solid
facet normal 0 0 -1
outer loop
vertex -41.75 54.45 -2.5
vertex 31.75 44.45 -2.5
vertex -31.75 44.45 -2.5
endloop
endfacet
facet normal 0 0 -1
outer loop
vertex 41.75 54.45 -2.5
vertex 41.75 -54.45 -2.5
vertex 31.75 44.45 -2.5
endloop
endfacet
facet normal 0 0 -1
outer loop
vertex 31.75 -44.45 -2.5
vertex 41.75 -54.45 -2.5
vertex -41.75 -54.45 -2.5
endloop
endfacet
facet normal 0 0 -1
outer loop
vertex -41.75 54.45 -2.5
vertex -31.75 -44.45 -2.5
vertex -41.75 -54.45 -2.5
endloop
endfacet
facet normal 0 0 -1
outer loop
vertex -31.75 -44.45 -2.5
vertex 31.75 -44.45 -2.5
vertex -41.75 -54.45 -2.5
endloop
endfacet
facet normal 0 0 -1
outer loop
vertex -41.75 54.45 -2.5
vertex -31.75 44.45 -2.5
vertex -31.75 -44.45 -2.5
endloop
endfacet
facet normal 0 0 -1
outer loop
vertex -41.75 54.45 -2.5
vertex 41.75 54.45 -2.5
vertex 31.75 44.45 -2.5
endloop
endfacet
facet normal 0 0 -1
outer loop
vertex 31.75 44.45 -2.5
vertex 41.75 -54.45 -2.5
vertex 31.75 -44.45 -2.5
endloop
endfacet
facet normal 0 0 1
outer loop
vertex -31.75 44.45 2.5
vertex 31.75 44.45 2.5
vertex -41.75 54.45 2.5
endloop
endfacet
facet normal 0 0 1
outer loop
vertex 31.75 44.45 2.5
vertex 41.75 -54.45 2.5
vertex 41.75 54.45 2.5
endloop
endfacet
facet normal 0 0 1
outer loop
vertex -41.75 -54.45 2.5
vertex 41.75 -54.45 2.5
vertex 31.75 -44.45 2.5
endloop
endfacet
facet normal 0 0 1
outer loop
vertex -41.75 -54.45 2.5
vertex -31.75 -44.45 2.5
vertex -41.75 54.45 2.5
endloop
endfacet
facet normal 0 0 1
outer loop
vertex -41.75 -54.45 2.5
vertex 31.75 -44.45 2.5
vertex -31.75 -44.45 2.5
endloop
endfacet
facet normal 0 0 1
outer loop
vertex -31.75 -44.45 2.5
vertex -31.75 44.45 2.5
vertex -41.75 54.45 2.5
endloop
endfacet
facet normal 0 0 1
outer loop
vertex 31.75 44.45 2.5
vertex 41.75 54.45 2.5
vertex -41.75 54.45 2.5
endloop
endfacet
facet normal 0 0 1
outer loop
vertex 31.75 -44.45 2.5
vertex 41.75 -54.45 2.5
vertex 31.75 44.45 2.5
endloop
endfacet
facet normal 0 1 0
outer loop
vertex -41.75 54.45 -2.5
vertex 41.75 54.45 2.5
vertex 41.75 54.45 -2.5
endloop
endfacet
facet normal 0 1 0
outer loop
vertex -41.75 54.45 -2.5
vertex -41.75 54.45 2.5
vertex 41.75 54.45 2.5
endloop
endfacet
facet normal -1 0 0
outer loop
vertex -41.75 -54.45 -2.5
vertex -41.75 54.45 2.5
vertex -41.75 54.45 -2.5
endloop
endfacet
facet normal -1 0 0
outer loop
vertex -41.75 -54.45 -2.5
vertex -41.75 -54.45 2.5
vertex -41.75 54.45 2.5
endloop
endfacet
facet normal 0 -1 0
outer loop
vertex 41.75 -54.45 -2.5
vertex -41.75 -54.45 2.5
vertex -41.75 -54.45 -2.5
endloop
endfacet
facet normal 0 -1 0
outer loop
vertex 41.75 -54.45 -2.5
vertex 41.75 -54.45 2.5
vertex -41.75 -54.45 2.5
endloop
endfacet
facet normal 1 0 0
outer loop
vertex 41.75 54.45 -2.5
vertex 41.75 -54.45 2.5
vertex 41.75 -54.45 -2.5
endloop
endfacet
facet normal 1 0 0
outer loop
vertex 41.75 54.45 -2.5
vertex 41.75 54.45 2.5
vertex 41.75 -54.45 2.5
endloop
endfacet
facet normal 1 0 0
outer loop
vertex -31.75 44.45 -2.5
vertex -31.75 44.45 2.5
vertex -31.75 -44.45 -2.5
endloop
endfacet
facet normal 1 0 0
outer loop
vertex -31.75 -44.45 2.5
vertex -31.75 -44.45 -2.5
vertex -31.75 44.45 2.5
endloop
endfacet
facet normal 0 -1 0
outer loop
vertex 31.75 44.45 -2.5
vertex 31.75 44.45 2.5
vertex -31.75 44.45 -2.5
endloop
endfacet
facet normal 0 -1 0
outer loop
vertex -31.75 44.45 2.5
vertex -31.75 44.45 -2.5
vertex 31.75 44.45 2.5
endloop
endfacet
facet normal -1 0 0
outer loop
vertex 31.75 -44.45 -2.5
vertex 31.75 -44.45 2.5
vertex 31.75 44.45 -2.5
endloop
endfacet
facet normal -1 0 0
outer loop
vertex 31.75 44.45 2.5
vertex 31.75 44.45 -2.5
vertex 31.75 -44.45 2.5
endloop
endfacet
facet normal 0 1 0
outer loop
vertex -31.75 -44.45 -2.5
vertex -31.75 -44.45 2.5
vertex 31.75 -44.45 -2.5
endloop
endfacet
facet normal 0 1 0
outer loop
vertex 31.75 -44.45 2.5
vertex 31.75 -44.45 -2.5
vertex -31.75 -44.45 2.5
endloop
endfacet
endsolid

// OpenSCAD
// Convert 
INCH = 25.4;
ATC = [2.5, 3.5] * INCH;
BOOKMARK = [2, 6] * INCH;

// Select one of these!
SHAPE = ATC;
//SHAPE = BOOKMARK;

// 1 cm margin around the shape
MARGIN = 20 * [1, 1];

THICKNESS = 5;

linear_extrude(THICKNESS, center=true)
difference() {
  square(SHAPE + MARGIN, center=true);
  square(SHAPE, center=true);
}
